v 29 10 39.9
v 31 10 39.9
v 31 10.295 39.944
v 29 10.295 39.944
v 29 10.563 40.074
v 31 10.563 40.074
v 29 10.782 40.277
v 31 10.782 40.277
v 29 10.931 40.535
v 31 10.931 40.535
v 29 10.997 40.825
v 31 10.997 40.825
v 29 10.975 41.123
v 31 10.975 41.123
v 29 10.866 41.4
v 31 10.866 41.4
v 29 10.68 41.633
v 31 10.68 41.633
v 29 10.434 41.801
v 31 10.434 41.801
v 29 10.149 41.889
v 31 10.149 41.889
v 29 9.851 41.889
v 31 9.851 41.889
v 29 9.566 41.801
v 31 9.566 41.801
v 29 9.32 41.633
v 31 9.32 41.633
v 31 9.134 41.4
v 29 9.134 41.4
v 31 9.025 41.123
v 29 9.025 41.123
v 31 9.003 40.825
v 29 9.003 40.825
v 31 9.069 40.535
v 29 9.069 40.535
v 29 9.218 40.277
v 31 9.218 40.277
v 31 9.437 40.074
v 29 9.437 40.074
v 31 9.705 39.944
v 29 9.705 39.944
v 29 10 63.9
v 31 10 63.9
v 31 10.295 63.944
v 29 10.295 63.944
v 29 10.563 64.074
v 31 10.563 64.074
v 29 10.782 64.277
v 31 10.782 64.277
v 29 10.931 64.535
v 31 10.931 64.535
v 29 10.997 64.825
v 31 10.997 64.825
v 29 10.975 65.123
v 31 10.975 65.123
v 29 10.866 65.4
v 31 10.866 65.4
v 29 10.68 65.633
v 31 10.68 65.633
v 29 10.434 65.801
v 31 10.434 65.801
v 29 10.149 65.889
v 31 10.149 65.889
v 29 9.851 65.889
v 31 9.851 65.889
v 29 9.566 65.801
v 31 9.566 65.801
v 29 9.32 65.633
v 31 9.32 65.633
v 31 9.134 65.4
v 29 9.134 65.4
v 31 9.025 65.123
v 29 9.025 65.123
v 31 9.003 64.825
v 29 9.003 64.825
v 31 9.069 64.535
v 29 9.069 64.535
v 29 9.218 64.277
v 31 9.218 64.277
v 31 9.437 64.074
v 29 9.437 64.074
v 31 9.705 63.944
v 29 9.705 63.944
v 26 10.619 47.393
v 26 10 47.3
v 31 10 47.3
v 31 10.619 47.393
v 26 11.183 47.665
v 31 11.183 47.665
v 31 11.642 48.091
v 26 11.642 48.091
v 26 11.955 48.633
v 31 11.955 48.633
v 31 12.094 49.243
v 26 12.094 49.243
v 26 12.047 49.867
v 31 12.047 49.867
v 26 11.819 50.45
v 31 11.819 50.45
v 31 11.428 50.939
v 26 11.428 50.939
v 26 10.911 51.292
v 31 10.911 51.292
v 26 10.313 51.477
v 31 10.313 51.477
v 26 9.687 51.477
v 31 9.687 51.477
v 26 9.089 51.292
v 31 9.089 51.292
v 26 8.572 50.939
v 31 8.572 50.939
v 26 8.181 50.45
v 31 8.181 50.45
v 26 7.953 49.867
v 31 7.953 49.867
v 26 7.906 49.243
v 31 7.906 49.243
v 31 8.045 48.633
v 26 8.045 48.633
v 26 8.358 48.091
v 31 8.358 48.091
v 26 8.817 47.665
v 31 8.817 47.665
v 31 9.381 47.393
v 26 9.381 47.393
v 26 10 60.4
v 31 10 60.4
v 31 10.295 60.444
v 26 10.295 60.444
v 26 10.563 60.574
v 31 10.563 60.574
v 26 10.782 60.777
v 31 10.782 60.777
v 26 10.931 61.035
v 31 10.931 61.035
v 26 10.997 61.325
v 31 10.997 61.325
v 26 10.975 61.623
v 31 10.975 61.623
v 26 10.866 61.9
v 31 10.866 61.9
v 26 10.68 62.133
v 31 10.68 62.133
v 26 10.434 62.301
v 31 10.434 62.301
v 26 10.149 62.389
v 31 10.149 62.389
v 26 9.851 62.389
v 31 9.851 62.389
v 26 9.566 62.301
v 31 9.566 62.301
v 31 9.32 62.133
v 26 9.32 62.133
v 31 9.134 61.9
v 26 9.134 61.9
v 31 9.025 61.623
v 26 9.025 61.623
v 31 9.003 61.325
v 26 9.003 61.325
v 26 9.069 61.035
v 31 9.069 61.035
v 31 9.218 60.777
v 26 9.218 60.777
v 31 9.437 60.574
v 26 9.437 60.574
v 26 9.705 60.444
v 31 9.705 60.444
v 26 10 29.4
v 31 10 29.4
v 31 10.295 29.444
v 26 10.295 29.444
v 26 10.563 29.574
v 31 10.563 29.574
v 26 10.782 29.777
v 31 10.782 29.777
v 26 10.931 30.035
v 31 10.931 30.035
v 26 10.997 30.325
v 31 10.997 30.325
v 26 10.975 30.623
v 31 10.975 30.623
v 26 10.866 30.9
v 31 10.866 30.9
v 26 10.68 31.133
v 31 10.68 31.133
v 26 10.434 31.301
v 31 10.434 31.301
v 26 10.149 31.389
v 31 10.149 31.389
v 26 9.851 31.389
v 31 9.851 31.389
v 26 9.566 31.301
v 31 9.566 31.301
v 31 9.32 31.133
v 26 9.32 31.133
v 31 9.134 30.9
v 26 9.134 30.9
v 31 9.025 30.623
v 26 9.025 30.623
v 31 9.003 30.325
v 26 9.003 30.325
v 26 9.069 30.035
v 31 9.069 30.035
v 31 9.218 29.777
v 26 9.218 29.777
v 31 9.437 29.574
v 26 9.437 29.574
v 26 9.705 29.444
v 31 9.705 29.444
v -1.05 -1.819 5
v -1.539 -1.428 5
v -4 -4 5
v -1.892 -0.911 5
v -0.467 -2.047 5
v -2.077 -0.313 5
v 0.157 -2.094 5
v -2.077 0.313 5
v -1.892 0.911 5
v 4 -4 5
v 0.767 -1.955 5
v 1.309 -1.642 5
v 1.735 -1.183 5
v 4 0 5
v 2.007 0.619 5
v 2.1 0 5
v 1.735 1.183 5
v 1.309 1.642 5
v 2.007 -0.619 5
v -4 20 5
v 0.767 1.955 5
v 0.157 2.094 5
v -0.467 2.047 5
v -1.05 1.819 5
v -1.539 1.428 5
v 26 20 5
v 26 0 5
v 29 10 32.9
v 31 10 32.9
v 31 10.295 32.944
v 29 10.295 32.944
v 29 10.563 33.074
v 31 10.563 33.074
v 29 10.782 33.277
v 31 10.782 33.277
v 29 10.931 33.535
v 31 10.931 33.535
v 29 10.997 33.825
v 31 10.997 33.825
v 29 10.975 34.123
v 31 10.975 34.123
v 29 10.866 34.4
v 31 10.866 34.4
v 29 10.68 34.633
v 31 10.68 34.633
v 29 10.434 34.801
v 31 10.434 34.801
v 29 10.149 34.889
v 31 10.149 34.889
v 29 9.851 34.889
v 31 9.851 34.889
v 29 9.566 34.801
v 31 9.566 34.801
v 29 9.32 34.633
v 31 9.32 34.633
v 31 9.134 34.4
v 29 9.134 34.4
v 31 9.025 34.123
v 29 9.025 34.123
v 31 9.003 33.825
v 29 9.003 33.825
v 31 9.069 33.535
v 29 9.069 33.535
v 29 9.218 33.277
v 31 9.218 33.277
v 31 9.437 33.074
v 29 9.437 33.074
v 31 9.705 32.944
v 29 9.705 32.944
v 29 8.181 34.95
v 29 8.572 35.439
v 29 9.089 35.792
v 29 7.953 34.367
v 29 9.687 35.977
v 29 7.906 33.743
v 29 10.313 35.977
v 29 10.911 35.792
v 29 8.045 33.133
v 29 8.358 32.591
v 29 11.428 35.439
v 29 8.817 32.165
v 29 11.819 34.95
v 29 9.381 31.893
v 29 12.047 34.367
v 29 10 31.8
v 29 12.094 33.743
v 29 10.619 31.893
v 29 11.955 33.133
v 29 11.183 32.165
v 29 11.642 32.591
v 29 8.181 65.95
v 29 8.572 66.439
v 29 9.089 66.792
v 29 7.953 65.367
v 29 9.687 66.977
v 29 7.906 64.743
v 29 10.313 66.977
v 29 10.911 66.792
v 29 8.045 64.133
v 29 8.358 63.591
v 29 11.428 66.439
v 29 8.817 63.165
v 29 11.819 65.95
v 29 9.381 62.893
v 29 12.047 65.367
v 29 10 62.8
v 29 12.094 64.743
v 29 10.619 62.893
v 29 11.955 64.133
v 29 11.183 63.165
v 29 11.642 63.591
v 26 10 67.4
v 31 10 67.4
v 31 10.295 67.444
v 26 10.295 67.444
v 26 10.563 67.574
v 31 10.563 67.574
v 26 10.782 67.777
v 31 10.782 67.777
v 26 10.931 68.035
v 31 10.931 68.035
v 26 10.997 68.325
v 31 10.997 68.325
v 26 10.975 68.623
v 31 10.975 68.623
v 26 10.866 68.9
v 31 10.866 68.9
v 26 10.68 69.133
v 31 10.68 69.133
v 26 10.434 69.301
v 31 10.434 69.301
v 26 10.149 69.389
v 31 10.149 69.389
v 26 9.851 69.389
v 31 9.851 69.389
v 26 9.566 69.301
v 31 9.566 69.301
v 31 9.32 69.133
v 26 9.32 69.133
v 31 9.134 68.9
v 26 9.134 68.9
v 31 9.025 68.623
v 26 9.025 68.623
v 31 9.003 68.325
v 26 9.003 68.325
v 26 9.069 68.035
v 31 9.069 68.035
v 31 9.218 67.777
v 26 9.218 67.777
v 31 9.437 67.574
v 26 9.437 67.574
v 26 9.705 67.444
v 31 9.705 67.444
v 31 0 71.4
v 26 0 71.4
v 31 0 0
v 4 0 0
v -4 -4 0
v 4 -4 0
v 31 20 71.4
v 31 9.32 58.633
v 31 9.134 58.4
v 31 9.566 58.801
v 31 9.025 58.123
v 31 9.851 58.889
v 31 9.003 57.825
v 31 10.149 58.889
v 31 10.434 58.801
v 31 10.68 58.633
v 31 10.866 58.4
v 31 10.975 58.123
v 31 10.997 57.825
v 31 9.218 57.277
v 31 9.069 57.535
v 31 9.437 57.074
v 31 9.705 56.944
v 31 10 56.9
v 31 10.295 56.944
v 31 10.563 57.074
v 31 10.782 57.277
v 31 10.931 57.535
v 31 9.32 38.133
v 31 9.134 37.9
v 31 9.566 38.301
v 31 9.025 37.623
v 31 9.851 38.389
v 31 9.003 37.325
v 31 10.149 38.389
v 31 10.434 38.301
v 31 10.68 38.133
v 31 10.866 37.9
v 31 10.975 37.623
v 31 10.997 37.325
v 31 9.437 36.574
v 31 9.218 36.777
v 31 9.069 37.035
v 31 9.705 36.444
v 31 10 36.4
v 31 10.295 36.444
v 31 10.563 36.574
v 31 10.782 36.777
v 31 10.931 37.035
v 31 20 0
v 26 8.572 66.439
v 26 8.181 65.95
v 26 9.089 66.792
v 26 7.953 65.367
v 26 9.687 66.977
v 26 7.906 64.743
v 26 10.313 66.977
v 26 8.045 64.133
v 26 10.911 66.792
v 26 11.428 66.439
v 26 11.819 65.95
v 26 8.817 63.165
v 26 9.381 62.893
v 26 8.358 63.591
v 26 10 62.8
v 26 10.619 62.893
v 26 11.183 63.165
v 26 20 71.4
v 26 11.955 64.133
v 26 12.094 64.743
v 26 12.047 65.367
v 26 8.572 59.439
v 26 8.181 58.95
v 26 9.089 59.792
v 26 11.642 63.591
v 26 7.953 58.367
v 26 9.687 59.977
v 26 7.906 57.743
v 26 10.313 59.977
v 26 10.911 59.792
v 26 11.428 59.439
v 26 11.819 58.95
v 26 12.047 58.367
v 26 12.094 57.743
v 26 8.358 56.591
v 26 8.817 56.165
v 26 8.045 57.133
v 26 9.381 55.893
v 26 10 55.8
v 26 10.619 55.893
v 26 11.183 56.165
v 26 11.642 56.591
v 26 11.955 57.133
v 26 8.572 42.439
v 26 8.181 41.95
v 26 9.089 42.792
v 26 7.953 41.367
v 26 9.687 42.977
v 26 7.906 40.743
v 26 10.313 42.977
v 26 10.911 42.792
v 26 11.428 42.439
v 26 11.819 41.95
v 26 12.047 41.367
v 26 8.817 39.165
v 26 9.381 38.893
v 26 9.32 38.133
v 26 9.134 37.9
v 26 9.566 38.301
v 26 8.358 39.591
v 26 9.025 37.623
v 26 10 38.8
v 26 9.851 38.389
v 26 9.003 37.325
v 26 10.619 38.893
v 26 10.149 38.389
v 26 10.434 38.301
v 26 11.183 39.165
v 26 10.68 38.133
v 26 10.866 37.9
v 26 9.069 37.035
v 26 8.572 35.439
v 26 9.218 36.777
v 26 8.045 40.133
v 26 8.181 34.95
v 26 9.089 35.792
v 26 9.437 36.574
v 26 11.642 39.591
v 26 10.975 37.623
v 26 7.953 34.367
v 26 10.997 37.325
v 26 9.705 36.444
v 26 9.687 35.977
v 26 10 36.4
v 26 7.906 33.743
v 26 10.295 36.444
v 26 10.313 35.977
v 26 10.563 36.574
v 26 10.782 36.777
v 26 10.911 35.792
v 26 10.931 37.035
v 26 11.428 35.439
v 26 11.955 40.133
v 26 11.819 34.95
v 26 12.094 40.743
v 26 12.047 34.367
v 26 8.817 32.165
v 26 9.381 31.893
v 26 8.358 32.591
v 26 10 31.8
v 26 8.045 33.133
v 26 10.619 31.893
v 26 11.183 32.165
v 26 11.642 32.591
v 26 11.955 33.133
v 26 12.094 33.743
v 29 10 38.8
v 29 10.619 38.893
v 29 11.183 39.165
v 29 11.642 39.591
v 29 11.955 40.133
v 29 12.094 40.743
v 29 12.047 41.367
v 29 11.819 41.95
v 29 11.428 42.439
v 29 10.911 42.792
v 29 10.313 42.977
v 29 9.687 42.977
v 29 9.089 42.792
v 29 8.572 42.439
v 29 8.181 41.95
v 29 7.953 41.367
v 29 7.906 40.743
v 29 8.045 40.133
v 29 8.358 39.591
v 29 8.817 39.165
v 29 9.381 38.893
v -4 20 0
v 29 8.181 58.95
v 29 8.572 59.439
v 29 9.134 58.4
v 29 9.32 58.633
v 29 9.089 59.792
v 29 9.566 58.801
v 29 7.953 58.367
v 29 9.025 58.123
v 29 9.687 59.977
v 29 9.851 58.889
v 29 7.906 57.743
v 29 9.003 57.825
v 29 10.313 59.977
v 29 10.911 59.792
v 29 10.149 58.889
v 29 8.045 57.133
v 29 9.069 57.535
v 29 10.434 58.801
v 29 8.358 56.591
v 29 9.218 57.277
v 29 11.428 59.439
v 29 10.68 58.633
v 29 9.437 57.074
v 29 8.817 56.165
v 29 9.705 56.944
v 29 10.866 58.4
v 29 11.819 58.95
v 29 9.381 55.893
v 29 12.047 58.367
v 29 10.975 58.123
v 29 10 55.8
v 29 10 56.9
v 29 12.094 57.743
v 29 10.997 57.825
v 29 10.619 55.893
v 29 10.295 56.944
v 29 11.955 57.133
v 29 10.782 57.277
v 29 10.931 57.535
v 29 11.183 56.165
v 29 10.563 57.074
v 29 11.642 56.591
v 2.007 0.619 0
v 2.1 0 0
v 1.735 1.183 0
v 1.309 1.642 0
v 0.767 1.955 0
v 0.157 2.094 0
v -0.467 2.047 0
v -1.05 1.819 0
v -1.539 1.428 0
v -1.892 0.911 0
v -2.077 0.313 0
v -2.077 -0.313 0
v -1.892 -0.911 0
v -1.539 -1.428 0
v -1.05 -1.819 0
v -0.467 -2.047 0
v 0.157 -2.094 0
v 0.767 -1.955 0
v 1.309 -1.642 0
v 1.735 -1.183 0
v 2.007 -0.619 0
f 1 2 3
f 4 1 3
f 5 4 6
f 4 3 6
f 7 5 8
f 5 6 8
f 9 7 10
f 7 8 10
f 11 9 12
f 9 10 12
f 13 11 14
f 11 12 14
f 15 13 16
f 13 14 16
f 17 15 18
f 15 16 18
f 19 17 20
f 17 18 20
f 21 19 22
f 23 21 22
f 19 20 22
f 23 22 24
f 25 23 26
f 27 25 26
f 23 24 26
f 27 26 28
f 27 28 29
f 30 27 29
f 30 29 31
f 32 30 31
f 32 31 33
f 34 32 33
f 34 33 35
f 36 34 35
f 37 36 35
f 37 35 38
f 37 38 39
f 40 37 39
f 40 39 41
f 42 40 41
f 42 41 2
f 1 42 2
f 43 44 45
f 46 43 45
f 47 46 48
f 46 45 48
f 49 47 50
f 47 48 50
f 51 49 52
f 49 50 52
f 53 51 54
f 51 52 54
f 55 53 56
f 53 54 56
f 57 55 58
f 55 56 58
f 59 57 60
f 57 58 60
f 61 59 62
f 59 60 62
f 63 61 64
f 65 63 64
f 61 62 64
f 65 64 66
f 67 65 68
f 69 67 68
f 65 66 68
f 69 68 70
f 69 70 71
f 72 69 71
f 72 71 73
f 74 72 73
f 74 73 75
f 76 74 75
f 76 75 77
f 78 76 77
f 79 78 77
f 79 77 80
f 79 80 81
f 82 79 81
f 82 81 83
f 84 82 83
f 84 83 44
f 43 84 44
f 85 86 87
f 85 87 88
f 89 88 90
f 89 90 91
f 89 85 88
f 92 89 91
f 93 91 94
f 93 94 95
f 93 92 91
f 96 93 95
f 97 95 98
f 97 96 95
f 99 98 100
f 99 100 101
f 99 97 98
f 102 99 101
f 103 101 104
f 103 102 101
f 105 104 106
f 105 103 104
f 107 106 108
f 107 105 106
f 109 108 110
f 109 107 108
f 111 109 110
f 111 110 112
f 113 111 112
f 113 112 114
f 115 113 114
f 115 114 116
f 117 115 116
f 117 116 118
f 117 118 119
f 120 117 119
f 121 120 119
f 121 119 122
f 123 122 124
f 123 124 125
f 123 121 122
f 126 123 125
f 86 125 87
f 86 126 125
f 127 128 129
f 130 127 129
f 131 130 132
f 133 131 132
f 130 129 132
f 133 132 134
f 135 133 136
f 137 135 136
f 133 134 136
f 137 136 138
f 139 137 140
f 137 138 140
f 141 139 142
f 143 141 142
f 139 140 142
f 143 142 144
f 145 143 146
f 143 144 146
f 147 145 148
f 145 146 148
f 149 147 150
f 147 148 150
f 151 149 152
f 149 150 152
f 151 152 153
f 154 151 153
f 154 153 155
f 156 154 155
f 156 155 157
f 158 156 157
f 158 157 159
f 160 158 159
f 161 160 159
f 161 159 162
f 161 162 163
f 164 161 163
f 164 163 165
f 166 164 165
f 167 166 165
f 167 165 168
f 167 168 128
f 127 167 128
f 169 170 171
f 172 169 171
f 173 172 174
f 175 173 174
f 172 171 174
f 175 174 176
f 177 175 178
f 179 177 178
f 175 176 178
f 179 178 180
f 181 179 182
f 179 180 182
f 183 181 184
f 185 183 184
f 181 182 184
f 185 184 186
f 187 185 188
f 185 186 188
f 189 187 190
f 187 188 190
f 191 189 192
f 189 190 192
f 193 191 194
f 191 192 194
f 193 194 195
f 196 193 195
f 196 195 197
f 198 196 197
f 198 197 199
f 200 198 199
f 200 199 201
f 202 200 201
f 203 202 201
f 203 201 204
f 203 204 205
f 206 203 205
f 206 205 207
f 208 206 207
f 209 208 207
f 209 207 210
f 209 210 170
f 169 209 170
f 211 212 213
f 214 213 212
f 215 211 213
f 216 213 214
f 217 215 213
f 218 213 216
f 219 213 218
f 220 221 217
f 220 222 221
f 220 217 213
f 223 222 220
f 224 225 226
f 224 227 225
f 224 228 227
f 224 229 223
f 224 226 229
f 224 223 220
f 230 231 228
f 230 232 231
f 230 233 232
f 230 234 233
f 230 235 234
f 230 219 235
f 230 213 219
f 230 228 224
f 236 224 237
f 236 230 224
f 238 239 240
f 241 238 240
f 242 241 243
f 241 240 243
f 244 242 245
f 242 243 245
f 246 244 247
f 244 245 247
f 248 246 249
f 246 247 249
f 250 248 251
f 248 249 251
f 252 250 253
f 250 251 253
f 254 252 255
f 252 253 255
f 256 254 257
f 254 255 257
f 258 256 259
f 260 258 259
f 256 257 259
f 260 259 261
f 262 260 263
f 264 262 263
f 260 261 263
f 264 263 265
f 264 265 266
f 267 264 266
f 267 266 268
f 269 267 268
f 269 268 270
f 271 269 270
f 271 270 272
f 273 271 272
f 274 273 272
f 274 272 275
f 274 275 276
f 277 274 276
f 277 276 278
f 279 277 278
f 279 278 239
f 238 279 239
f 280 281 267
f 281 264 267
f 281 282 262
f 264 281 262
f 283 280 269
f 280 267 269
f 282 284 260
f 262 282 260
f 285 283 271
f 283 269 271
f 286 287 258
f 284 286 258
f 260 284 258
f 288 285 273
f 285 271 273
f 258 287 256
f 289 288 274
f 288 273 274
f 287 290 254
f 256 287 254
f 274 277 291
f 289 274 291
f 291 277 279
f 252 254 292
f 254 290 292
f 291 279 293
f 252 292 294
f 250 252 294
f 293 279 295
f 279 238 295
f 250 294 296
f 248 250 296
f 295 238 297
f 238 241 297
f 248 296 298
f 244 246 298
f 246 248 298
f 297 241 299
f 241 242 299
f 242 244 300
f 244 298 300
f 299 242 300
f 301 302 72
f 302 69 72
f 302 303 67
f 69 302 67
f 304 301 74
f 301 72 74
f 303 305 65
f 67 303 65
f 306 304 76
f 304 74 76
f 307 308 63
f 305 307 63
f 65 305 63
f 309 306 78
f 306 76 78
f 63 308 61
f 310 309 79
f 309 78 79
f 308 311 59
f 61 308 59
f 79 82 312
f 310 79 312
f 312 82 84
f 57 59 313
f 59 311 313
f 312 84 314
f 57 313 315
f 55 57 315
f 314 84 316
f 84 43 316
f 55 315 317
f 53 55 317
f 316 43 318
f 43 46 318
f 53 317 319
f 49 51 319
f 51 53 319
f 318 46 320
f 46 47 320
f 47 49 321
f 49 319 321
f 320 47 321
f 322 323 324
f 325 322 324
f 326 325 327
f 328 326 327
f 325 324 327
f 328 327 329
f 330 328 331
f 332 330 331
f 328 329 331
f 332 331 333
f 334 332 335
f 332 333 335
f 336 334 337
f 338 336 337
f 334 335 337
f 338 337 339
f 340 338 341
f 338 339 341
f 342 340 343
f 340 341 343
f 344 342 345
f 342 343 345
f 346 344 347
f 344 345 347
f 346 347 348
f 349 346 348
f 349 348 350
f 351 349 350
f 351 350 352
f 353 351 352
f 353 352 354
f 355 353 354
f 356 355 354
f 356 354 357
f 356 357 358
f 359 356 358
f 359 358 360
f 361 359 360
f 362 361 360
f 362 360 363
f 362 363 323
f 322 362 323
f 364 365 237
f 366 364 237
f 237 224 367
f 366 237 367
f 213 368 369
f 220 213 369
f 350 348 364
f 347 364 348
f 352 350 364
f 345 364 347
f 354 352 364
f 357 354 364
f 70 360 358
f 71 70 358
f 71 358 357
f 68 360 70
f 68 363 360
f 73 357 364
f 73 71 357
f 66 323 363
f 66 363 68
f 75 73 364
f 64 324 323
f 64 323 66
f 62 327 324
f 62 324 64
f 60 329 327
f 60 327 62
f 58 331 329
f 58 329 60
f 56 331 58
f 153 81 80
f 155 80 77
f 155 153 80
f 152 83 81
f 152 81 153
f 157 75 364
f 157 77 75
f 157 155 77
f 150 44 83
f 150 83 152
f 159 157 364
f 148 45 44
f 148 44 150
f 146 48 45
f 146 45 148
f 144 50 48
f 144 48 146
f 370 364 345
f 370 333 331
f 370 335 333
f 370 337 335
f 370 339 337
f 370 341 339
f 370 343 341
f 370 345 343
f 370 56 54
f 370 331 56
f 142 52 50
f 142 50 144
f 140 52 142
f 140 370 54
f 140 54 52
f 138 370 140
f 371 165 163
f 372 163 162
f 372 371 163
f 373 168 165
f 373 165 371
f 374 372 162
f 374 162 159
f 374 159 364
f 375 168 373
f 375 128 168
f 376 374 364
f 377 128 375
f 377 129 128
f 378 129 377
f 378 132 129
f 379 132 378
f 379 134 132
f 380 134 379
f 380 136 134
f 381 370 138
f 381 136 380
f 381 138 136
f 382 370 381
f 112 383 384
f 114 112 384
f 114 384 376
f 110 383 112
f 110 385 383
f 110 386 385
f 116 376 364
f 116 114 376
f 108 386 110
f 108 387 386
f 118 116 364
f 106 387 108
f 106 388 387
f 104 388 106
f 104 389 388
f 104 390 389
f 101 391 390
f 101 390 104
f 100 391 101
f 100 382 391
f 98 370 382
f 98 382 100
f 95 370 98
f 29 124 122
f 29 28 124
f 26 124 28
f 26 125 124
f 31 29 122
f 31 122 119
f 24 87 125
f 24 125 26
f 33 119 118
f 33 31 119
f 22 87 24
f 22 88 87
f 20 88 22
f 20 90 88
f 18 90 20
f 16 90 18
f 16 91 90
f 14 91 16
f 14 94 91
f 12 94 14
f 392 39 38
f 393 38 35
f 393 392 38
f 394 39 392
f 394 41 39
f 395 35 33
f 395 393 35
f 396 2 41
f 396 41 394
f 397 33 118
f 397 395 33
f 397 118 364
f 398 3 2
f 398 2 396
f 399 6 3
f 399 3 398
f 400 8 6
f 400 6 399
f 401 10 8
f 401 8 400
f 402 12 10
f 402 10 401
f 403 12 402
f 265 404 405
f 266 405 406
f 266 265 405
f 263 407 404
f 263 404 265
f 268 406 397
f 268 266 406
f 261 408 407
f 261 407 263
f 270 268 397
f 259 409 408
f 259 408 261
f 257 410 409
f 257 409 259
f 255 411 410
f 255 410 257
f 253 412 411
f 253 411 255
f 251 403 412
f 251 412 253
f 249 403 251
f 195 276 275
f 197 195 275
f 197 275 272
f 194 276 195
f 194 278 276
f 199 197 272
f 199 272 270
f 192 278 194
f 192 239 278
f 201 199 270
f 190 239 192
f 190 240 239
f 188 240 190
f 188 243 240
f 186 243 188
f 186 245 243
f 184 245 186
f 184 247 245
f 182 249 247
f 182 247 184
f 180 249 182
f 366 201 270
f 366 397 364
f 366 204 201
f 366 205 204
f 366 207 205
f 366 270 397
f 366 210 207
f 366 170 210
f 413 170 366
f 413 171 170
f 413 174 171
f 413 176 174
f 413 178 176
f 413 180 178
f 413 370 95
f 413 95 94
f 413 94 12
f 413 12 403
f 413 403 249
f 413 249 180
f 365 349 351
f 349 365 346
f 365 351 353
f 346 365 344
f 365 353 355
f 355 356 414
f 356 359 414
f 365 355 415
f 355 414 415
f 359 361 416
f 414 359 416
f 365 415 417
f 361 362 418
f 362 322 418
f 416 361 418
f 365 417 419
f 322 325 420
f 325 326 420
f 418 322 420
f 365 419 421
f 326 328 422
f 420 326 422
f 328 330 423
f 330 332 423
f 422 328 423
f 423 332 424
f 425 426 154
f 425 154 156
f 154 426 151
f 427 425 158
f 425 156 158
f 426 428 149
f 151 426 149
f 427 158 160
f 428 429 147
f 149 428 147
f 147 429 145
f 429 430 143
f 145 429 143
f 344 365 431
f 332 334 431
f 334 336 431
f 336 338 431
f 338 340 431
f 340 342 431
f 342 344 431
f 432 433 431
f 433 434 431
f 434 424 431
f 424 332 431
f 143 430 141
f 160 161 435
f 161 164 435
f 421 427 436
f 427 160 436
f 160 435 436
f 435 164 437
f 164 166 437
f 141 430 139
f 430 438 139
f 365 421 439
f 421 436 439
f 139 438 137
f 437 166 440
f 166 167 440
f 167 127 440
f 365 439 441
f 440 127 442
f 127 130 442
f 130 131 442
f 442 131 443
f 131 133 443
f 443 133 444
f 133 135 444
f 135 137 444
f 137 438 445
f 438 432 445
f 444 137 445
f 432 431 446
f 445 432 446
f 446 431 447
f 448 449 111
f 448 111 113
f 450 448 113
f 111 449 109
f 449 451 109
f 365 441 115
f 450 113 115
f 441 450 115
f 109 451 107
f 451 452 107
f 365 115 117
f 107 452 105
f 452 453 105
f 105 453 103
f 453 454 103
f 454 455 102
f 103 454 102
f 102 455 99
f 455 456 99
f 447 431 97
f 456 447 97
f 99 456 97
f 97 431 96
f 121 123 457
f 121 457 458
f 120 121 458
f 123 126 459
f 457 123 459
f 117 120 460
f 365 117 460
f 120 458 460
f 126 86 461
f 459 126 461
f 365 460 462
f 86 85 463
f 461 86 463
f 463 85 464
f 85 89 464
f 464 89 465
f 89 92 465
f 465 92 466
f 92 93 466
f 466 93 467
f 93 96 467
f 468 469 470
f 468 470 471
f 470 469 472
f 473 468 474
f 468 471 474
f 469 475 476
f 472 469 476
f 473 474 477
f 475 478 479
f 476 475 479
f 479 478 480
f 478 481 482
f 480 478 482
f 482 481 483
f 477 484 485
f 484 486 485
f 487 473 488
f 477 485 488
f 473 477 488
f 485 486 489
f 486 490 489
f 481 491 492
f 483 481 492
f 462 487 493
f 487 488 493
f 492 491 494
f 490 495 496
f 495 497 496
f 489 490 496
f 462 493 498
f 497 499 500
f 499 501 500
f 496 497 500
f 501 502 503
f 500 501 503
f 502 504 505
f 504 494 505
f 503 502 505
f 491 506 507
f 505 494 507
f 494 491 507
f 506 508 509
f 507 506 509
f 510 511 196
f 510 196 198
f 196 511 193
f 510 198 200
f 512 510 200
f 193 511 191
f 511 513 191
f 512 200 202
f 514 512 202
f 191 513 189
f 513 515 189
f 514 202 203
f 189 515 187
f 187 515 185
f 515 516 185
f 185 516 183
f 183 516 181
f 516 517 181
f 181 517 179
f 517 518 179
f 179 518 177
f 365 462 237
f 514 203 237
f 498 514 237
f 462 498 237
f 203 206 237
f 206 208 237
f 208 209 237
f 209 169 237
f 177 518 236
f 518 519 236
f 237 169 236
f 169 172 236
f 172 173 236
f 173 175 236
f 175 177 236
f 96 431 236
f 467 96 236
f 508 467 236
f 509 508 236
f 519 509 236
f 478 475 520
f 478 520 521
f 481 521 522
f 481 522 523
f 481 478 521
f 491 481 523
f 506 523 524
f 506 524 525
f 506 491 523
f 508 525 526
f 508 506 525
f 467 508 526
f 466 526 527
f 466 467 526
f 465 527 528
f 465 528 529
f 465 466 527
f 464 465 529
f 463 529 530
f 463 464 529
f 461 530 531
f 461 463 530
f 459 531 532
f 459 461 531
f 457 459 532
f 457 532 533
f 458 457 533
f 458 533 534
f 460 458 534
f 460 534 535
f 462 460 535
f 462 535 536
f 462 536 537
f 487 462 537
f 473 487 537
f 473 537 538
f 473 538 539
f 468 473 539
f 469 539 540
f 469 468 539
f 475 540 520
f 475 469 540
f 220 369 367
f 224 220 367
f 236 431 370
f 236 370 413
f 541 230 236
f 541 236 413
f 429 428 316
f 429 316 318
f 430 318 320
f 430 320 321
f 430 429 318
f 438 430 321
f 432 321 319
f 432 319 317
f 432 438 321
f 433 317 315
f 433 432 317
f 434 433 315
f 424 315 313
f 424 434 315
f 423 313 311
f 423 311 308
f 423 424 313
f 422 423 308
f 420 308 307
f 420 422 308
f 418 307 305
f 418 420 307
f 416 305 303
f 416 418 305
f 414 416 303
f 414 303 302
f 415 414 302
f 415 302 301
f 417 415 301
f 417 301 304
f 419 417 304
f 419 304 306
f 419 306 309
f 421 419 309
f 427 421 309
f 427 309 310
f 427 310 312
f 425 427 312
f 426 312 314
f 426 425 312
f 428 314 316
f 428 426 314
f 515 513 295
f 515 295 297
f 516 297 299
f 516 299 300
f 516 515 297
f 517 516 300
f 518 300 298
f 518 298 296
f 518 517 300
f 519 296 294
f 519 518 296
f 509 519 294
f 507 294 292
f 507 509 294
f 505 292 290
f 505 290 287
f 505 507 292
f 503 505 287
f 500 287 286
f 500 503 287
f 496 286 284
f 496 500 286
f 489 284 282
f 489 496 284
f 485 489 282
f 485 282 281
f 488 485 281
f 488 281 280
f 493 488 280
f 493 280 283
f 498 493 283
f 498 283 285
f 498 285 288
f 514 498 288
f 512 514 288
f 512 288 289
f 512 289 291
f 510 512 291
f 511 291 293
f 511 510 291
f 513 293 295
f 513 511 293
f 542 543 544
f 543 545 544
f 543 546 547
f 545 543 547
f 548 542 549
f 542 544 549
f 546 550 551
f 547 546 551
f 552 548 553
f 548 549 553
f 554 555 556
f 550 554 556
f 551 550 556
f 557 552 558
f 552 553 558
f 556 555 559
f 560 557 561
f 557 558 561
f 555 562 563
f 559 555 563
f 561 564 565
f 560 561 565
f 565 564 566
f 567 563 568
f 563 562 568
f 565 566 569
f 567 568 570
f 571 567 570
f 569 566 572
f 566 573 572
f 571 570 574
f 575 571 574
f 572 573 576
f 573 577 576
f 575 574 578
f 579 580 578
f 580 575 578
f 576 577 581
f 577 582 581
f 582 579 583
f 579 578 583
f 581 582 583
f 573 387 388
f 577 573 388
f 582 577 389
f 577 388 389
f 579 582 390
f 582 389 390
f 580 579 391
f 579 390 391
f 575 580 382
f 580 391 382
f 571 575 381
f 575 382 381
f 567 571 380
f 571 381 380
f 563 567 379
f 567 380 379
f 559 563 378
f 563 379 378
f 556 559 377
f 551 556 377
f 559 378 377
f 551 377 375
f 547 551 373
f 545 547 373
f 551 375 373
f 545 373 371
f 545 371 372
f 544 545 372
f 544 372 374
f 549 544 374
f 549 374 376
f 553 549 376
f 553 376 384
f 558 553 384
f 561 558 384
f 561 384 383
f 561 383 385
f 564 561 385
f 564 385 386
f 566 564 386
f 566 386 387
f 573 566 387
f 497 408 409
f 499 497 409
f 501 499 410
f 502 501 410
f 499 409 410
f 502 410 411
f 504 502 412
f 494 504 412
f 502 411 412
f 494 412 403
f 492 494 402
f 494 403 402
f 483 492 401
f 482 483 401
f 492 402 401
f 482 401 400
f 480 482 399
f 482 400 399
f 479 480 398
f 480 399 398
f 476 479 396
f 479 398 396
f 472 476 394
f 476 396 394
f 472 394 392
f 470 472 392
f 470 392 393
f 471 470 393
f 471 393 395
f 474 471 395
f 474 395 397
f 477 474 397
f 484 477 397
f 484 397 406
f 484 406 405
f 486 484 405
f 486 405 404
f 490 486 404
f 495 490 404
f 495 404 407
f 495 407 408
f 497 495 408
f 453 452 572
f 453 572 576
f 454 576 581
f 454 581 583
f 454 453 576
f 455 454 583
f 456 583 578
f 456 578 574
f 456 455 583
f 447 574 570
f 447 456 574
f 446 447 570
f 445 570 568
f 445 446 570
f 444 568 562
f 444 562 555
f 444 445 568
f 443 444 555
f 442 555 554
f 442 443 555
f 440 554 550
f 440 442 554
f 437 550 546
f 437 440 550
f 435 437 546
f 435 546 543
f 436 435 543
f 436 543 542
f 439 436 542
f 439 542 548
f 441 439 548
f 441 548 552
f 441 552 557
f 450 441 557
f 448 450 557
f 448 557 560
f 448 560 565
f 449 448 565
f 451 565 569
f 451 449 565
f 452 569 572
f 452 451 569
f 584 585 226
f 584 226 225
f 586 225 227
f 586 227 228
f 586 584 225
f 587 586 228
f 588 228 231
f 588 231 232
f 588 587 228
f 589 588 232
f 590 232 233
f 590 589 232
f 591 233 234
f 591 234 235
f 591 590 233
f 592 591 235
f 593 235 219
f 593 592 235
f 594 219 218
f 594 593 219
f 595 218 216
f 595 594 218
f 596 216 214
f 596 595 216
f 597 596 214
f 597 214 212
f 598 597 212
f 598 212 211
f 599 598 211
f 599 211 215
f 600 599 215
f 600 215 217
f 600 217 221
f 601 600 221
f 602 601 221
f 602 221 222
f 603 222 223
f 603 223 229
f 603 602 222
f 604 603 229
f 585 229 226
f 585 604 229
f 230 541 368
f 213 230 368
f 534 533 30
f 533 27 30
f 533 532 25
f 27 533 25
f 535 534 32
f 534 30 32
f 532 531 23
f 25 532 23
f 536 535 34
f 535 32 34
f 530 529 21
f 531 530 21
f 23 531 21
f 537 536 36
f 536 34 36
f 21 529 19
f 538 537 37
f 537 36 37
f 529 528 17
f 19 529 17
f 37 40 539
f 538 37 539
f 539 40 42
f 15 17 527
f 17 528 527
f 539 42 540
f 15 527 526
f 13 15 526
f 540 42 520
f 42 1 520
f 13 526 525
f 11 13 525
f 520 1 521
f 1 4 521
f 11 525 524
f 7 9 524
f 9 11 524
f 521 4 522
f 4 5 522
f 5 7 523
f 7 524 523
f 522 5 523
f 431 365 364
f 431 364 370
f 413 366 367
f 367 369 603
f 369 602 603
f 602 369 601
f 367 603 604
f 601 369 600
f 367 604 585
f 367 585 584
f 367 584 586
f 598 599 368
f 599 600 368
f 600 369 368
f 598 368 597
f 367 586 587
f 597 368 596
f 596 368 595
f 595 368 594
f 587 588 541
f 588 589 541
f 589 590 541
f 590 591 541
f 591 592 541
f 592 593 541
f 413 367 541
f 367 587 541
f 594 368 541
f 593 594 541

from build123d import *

# Parameters (mm, degrees)
CROQUIS1_R              = 2.1
SALIENTE_EXTRUIR1_DEPTH = 5
CROQUIS2_W              = 71.4
CROQUIS2_H              = 20
CROQUIS2_R              = 2.1
SALIENTE_EXTRUIR2_DEPTH = 5
CORTAR_EXTRUIR1_REACH   = 83.994
CROQUIS4_R              = 1
CORTAR_EXTRUIR2_START   = -5
CROQUIS5_R              = 2.1
CORTAR_EXTRUIR2_DEPTH   = 3


with BuildPart() as part:
    # Croquis1 → Saliente-Extruir1 (new body)
    with BuildSketch(Plane.XY):
        Polygon((26, 20), (-4, 20), (-4, -4), (4, -4), (4, 0), (26, 0), align=None)
        Circle(CROQUIS1_R, mode=Mode.SUBTRACT)
    extrude(amount=SALIENTE_EXTRUIR1_DEPTH)

    # Croquis2 → Saliente-Extruir2 (add)
    with BuildSketch(Plane(origin=(26, 0, 0), x_dir=(0, 0, -1), z_dir=(1, 0, 0))):
        with Locations((-35.7, 10)):
            Rectangle(CROQUIS2_W, CROQUIS2_H)
        with Locations((-49.4, 10)):
            Circle(CROQUIS2_R, mode=Mode.SUBTRACT)
    extrude(amount=SALIENTE_EXTRUIR2_DEPTH)

    # Croquis4 → Cortar-Extruir1 (cut, up to next)
    with BuildSketch(Plane(origin=(31, 0, 0), x_dir=(0, 0, -1), z_dir=(1, 0, 0)), mode=Mode.PRIVATE) as cortar_extruir1_sk1:
        with Locations((-68.4, 10)):
            Circle(CROQUIS4_R)
    cortar_extruir1_tool1 = extrude(cortar_extruir1_sk1.sketch, amount=-CORTAR_EXTRUIR1_REACH, mode=Mode.PRIVATE) & part.part
    # Croquis4 → Cortar-Extruir1 (cut, up to next)
    with BuildSketch(Plane(origin=(31, 0, 0), x_dir=(0, 0, -1), z_dir=(1, 0, 0)), mode=Mode.PRIVATE) as cortar_extruir1_sk2:
        with Locations((-64.9, 10)):
            Circle(CROQUIS4_R)
    cortar_extruir1_tool2 = extrude(cortar_extruir1_sk2.sketch, amount=-CORTAR_EXTRUIR1_REACH, mode=Mode.PRIVATE) & part.part
    # Croquis4 → Cortar-Extruir1 (cut, up to next)
    with BuildSketch(Plane(origin=(31, 0, 0), x_dir=(0, 0, -1), z_dir=(1, 0, 0)), mode=Mode.PRIVATE) as cortar_extruir1_sk3:
        with Locations((-61.4, 10)):
            Circle(CROQUIS4_R)
    cortar_extruir1_tool3 = extrude(cortar_extruir1_sk3.sketch, amount=-CORTAR_EXTRUIR1_REACH, mode=Mode.PRIVATE) & part.part
    # Croquis4 → Cortar-Extruir1 (cut, up to next)
    with BuildSketch(Plane(origin=(31, 0, 0), x_dir=(0, 0, -1), z_dir=(1, 0, 0)), mode=Mode.PRIVATE) as cortar_extruir1_sk4:
        with Locations((-57.9, 10)):
            Circle(CROQUIS4_R)
    cortar_extruir1_tool4 = extrude(cortar_extruir1_sk4.sketch, amount=-CORTAR_EXTRUIR1_REACH, mode=Mode.PRIVATE) & part.part
    # Croquis4 → Cortar-Extruir1 (cut, up to next)
    with BuildSketch(Plane(origin=(31, 0, 0), x_dir=(0, 0, -1), z_dir=(1, 0, 0)), mode=Mode.PRIVATE) as cortar_extruir1_sk5:
        with Locations((-40.9, 10)):
            Circle(CROQUIS4_R)
    cortar_extruir1_tool5 = extrude(cortar_extruir1_sk5.sketch, amount=-CORTAR_EXTRUIR1_REACH, mode=Mode.PRIVATE) & part.part
    # Croquis4 → Cortar-Extruir1 (cut, up to next)
    with BuildSketch(Plane(origin=(31, 0, 0), x_dir=(0, 0, -1), z_dir=(1, 0, 0)), mode=Mode.PRIVATE) as cortar_extruir1_sk6:
        with Locations((-37.4, 10)):
            Circle(CROQUIS4_R)
    cortar_extruir1_tool6 = extrude(cortar_extruir1_sk6.sketch, amount=-CORTAR_EXTRUIR1_REACH, mode=Mode.PRIVATE) & part.part
    # Croquis4 → Cortar-Extruir1 (cut, up to next)
    with BuildSketch(Plane(origin=(31, 0, 0), x_dir=(0, 0, -1), z_dir=(1, 0, 0)), mode=Mode.PRIVATE) as cortar_extruir1_sk7:
        with Locations((-33.9, 10)):
            Circle(CROQUIS4_R)
    cortar_extruir1_tool7 = extrude(cortar_extruir1_sk7.sketch, amount=-CORTAR_EXTRUIR1_REACH, mode=Mode.PRIVATE) & part.part
    # Croquis4 → Cortar-Extruir1 (cut, up to next)
    with BuildSketch(Plane(origin=(31, 0, 0), x_dir=(0, 0, -1), z_dir=(1, 0, 0)), mode=Mode.PRIVATE) as cortar_extruir1_sk8:
        with Locations((-30.4, 10)):
            Circle(CROQUIS4_R)
    cortar_extruir1_tool8 = extrude(cortar_extruir1_sk8.sketch, amount=-CORTAR_EXTRUIR1_REACH, mode=Mode.PRIVATE) & part.part
    add(cortar_extruir1_tool1.solids().sort_by_distance((31, 10, 68.4))[0], mode=Mode.SUBTRACT)
    add(cortar_extruir1_tool2.solids().sort_by_distance((31, 10, 64.9))[0], mode=Mode.SUBTRACT)
    add(cortar_extruir1_tool3.solids().sort_by_distance((31, 10, 61.4))[0], mode=Mode.SUBTRACT)
    add(cortar_extruir1_tool4.solids().sort_by_distance((31, 10, 57.9))[0], mode=Mode.SUBTRACT)
    add(cortar_extruir1_tool5.solids().sort_by_distance((31, 10, 40.9))[0], mode=Mode.SUBTRACT)
    add(cortar_extruir1_tool6.solids().sort_by_distance((31, 10, 37.4))[0], mode=Mode.SUBTRACT)
    add(cortar_extruir1_tool7.solids().sort_by_distance((31, 10, 33.9))[0], mode=Mode.SUBTRACT)
    add(cortar_extruir1_tool8.solids().sort_by_distance((31, 10, 30.4))[0], mode=Mode.SUBTRACT)

    # Croquis5 → Cortar-Extruir2 (cut)
    with BuildSketch(Plane(origin=(31, 0, 0), x_dir=(0, 0, -1), z_dir=(1, 0, 0)).offset(CORTAR_EXTRUIR2_START)):
        with Locations((-57.9, 10)):
            Circle(CROQUIS5_R)
        with Locations((-64.9, 10)):
            Circle(CROQUIS5_R)
        with Locations((-40.9, 10)):
            Circle(CROQUIS5_R)
        with Locations((-33.9, 10)):
            Circle(CROQUIS5_R)
    extrude(amount=CORTAR_EXTRUIR2_DEPTH, mode=Mode.SUBTRACT)


solid = part.part
